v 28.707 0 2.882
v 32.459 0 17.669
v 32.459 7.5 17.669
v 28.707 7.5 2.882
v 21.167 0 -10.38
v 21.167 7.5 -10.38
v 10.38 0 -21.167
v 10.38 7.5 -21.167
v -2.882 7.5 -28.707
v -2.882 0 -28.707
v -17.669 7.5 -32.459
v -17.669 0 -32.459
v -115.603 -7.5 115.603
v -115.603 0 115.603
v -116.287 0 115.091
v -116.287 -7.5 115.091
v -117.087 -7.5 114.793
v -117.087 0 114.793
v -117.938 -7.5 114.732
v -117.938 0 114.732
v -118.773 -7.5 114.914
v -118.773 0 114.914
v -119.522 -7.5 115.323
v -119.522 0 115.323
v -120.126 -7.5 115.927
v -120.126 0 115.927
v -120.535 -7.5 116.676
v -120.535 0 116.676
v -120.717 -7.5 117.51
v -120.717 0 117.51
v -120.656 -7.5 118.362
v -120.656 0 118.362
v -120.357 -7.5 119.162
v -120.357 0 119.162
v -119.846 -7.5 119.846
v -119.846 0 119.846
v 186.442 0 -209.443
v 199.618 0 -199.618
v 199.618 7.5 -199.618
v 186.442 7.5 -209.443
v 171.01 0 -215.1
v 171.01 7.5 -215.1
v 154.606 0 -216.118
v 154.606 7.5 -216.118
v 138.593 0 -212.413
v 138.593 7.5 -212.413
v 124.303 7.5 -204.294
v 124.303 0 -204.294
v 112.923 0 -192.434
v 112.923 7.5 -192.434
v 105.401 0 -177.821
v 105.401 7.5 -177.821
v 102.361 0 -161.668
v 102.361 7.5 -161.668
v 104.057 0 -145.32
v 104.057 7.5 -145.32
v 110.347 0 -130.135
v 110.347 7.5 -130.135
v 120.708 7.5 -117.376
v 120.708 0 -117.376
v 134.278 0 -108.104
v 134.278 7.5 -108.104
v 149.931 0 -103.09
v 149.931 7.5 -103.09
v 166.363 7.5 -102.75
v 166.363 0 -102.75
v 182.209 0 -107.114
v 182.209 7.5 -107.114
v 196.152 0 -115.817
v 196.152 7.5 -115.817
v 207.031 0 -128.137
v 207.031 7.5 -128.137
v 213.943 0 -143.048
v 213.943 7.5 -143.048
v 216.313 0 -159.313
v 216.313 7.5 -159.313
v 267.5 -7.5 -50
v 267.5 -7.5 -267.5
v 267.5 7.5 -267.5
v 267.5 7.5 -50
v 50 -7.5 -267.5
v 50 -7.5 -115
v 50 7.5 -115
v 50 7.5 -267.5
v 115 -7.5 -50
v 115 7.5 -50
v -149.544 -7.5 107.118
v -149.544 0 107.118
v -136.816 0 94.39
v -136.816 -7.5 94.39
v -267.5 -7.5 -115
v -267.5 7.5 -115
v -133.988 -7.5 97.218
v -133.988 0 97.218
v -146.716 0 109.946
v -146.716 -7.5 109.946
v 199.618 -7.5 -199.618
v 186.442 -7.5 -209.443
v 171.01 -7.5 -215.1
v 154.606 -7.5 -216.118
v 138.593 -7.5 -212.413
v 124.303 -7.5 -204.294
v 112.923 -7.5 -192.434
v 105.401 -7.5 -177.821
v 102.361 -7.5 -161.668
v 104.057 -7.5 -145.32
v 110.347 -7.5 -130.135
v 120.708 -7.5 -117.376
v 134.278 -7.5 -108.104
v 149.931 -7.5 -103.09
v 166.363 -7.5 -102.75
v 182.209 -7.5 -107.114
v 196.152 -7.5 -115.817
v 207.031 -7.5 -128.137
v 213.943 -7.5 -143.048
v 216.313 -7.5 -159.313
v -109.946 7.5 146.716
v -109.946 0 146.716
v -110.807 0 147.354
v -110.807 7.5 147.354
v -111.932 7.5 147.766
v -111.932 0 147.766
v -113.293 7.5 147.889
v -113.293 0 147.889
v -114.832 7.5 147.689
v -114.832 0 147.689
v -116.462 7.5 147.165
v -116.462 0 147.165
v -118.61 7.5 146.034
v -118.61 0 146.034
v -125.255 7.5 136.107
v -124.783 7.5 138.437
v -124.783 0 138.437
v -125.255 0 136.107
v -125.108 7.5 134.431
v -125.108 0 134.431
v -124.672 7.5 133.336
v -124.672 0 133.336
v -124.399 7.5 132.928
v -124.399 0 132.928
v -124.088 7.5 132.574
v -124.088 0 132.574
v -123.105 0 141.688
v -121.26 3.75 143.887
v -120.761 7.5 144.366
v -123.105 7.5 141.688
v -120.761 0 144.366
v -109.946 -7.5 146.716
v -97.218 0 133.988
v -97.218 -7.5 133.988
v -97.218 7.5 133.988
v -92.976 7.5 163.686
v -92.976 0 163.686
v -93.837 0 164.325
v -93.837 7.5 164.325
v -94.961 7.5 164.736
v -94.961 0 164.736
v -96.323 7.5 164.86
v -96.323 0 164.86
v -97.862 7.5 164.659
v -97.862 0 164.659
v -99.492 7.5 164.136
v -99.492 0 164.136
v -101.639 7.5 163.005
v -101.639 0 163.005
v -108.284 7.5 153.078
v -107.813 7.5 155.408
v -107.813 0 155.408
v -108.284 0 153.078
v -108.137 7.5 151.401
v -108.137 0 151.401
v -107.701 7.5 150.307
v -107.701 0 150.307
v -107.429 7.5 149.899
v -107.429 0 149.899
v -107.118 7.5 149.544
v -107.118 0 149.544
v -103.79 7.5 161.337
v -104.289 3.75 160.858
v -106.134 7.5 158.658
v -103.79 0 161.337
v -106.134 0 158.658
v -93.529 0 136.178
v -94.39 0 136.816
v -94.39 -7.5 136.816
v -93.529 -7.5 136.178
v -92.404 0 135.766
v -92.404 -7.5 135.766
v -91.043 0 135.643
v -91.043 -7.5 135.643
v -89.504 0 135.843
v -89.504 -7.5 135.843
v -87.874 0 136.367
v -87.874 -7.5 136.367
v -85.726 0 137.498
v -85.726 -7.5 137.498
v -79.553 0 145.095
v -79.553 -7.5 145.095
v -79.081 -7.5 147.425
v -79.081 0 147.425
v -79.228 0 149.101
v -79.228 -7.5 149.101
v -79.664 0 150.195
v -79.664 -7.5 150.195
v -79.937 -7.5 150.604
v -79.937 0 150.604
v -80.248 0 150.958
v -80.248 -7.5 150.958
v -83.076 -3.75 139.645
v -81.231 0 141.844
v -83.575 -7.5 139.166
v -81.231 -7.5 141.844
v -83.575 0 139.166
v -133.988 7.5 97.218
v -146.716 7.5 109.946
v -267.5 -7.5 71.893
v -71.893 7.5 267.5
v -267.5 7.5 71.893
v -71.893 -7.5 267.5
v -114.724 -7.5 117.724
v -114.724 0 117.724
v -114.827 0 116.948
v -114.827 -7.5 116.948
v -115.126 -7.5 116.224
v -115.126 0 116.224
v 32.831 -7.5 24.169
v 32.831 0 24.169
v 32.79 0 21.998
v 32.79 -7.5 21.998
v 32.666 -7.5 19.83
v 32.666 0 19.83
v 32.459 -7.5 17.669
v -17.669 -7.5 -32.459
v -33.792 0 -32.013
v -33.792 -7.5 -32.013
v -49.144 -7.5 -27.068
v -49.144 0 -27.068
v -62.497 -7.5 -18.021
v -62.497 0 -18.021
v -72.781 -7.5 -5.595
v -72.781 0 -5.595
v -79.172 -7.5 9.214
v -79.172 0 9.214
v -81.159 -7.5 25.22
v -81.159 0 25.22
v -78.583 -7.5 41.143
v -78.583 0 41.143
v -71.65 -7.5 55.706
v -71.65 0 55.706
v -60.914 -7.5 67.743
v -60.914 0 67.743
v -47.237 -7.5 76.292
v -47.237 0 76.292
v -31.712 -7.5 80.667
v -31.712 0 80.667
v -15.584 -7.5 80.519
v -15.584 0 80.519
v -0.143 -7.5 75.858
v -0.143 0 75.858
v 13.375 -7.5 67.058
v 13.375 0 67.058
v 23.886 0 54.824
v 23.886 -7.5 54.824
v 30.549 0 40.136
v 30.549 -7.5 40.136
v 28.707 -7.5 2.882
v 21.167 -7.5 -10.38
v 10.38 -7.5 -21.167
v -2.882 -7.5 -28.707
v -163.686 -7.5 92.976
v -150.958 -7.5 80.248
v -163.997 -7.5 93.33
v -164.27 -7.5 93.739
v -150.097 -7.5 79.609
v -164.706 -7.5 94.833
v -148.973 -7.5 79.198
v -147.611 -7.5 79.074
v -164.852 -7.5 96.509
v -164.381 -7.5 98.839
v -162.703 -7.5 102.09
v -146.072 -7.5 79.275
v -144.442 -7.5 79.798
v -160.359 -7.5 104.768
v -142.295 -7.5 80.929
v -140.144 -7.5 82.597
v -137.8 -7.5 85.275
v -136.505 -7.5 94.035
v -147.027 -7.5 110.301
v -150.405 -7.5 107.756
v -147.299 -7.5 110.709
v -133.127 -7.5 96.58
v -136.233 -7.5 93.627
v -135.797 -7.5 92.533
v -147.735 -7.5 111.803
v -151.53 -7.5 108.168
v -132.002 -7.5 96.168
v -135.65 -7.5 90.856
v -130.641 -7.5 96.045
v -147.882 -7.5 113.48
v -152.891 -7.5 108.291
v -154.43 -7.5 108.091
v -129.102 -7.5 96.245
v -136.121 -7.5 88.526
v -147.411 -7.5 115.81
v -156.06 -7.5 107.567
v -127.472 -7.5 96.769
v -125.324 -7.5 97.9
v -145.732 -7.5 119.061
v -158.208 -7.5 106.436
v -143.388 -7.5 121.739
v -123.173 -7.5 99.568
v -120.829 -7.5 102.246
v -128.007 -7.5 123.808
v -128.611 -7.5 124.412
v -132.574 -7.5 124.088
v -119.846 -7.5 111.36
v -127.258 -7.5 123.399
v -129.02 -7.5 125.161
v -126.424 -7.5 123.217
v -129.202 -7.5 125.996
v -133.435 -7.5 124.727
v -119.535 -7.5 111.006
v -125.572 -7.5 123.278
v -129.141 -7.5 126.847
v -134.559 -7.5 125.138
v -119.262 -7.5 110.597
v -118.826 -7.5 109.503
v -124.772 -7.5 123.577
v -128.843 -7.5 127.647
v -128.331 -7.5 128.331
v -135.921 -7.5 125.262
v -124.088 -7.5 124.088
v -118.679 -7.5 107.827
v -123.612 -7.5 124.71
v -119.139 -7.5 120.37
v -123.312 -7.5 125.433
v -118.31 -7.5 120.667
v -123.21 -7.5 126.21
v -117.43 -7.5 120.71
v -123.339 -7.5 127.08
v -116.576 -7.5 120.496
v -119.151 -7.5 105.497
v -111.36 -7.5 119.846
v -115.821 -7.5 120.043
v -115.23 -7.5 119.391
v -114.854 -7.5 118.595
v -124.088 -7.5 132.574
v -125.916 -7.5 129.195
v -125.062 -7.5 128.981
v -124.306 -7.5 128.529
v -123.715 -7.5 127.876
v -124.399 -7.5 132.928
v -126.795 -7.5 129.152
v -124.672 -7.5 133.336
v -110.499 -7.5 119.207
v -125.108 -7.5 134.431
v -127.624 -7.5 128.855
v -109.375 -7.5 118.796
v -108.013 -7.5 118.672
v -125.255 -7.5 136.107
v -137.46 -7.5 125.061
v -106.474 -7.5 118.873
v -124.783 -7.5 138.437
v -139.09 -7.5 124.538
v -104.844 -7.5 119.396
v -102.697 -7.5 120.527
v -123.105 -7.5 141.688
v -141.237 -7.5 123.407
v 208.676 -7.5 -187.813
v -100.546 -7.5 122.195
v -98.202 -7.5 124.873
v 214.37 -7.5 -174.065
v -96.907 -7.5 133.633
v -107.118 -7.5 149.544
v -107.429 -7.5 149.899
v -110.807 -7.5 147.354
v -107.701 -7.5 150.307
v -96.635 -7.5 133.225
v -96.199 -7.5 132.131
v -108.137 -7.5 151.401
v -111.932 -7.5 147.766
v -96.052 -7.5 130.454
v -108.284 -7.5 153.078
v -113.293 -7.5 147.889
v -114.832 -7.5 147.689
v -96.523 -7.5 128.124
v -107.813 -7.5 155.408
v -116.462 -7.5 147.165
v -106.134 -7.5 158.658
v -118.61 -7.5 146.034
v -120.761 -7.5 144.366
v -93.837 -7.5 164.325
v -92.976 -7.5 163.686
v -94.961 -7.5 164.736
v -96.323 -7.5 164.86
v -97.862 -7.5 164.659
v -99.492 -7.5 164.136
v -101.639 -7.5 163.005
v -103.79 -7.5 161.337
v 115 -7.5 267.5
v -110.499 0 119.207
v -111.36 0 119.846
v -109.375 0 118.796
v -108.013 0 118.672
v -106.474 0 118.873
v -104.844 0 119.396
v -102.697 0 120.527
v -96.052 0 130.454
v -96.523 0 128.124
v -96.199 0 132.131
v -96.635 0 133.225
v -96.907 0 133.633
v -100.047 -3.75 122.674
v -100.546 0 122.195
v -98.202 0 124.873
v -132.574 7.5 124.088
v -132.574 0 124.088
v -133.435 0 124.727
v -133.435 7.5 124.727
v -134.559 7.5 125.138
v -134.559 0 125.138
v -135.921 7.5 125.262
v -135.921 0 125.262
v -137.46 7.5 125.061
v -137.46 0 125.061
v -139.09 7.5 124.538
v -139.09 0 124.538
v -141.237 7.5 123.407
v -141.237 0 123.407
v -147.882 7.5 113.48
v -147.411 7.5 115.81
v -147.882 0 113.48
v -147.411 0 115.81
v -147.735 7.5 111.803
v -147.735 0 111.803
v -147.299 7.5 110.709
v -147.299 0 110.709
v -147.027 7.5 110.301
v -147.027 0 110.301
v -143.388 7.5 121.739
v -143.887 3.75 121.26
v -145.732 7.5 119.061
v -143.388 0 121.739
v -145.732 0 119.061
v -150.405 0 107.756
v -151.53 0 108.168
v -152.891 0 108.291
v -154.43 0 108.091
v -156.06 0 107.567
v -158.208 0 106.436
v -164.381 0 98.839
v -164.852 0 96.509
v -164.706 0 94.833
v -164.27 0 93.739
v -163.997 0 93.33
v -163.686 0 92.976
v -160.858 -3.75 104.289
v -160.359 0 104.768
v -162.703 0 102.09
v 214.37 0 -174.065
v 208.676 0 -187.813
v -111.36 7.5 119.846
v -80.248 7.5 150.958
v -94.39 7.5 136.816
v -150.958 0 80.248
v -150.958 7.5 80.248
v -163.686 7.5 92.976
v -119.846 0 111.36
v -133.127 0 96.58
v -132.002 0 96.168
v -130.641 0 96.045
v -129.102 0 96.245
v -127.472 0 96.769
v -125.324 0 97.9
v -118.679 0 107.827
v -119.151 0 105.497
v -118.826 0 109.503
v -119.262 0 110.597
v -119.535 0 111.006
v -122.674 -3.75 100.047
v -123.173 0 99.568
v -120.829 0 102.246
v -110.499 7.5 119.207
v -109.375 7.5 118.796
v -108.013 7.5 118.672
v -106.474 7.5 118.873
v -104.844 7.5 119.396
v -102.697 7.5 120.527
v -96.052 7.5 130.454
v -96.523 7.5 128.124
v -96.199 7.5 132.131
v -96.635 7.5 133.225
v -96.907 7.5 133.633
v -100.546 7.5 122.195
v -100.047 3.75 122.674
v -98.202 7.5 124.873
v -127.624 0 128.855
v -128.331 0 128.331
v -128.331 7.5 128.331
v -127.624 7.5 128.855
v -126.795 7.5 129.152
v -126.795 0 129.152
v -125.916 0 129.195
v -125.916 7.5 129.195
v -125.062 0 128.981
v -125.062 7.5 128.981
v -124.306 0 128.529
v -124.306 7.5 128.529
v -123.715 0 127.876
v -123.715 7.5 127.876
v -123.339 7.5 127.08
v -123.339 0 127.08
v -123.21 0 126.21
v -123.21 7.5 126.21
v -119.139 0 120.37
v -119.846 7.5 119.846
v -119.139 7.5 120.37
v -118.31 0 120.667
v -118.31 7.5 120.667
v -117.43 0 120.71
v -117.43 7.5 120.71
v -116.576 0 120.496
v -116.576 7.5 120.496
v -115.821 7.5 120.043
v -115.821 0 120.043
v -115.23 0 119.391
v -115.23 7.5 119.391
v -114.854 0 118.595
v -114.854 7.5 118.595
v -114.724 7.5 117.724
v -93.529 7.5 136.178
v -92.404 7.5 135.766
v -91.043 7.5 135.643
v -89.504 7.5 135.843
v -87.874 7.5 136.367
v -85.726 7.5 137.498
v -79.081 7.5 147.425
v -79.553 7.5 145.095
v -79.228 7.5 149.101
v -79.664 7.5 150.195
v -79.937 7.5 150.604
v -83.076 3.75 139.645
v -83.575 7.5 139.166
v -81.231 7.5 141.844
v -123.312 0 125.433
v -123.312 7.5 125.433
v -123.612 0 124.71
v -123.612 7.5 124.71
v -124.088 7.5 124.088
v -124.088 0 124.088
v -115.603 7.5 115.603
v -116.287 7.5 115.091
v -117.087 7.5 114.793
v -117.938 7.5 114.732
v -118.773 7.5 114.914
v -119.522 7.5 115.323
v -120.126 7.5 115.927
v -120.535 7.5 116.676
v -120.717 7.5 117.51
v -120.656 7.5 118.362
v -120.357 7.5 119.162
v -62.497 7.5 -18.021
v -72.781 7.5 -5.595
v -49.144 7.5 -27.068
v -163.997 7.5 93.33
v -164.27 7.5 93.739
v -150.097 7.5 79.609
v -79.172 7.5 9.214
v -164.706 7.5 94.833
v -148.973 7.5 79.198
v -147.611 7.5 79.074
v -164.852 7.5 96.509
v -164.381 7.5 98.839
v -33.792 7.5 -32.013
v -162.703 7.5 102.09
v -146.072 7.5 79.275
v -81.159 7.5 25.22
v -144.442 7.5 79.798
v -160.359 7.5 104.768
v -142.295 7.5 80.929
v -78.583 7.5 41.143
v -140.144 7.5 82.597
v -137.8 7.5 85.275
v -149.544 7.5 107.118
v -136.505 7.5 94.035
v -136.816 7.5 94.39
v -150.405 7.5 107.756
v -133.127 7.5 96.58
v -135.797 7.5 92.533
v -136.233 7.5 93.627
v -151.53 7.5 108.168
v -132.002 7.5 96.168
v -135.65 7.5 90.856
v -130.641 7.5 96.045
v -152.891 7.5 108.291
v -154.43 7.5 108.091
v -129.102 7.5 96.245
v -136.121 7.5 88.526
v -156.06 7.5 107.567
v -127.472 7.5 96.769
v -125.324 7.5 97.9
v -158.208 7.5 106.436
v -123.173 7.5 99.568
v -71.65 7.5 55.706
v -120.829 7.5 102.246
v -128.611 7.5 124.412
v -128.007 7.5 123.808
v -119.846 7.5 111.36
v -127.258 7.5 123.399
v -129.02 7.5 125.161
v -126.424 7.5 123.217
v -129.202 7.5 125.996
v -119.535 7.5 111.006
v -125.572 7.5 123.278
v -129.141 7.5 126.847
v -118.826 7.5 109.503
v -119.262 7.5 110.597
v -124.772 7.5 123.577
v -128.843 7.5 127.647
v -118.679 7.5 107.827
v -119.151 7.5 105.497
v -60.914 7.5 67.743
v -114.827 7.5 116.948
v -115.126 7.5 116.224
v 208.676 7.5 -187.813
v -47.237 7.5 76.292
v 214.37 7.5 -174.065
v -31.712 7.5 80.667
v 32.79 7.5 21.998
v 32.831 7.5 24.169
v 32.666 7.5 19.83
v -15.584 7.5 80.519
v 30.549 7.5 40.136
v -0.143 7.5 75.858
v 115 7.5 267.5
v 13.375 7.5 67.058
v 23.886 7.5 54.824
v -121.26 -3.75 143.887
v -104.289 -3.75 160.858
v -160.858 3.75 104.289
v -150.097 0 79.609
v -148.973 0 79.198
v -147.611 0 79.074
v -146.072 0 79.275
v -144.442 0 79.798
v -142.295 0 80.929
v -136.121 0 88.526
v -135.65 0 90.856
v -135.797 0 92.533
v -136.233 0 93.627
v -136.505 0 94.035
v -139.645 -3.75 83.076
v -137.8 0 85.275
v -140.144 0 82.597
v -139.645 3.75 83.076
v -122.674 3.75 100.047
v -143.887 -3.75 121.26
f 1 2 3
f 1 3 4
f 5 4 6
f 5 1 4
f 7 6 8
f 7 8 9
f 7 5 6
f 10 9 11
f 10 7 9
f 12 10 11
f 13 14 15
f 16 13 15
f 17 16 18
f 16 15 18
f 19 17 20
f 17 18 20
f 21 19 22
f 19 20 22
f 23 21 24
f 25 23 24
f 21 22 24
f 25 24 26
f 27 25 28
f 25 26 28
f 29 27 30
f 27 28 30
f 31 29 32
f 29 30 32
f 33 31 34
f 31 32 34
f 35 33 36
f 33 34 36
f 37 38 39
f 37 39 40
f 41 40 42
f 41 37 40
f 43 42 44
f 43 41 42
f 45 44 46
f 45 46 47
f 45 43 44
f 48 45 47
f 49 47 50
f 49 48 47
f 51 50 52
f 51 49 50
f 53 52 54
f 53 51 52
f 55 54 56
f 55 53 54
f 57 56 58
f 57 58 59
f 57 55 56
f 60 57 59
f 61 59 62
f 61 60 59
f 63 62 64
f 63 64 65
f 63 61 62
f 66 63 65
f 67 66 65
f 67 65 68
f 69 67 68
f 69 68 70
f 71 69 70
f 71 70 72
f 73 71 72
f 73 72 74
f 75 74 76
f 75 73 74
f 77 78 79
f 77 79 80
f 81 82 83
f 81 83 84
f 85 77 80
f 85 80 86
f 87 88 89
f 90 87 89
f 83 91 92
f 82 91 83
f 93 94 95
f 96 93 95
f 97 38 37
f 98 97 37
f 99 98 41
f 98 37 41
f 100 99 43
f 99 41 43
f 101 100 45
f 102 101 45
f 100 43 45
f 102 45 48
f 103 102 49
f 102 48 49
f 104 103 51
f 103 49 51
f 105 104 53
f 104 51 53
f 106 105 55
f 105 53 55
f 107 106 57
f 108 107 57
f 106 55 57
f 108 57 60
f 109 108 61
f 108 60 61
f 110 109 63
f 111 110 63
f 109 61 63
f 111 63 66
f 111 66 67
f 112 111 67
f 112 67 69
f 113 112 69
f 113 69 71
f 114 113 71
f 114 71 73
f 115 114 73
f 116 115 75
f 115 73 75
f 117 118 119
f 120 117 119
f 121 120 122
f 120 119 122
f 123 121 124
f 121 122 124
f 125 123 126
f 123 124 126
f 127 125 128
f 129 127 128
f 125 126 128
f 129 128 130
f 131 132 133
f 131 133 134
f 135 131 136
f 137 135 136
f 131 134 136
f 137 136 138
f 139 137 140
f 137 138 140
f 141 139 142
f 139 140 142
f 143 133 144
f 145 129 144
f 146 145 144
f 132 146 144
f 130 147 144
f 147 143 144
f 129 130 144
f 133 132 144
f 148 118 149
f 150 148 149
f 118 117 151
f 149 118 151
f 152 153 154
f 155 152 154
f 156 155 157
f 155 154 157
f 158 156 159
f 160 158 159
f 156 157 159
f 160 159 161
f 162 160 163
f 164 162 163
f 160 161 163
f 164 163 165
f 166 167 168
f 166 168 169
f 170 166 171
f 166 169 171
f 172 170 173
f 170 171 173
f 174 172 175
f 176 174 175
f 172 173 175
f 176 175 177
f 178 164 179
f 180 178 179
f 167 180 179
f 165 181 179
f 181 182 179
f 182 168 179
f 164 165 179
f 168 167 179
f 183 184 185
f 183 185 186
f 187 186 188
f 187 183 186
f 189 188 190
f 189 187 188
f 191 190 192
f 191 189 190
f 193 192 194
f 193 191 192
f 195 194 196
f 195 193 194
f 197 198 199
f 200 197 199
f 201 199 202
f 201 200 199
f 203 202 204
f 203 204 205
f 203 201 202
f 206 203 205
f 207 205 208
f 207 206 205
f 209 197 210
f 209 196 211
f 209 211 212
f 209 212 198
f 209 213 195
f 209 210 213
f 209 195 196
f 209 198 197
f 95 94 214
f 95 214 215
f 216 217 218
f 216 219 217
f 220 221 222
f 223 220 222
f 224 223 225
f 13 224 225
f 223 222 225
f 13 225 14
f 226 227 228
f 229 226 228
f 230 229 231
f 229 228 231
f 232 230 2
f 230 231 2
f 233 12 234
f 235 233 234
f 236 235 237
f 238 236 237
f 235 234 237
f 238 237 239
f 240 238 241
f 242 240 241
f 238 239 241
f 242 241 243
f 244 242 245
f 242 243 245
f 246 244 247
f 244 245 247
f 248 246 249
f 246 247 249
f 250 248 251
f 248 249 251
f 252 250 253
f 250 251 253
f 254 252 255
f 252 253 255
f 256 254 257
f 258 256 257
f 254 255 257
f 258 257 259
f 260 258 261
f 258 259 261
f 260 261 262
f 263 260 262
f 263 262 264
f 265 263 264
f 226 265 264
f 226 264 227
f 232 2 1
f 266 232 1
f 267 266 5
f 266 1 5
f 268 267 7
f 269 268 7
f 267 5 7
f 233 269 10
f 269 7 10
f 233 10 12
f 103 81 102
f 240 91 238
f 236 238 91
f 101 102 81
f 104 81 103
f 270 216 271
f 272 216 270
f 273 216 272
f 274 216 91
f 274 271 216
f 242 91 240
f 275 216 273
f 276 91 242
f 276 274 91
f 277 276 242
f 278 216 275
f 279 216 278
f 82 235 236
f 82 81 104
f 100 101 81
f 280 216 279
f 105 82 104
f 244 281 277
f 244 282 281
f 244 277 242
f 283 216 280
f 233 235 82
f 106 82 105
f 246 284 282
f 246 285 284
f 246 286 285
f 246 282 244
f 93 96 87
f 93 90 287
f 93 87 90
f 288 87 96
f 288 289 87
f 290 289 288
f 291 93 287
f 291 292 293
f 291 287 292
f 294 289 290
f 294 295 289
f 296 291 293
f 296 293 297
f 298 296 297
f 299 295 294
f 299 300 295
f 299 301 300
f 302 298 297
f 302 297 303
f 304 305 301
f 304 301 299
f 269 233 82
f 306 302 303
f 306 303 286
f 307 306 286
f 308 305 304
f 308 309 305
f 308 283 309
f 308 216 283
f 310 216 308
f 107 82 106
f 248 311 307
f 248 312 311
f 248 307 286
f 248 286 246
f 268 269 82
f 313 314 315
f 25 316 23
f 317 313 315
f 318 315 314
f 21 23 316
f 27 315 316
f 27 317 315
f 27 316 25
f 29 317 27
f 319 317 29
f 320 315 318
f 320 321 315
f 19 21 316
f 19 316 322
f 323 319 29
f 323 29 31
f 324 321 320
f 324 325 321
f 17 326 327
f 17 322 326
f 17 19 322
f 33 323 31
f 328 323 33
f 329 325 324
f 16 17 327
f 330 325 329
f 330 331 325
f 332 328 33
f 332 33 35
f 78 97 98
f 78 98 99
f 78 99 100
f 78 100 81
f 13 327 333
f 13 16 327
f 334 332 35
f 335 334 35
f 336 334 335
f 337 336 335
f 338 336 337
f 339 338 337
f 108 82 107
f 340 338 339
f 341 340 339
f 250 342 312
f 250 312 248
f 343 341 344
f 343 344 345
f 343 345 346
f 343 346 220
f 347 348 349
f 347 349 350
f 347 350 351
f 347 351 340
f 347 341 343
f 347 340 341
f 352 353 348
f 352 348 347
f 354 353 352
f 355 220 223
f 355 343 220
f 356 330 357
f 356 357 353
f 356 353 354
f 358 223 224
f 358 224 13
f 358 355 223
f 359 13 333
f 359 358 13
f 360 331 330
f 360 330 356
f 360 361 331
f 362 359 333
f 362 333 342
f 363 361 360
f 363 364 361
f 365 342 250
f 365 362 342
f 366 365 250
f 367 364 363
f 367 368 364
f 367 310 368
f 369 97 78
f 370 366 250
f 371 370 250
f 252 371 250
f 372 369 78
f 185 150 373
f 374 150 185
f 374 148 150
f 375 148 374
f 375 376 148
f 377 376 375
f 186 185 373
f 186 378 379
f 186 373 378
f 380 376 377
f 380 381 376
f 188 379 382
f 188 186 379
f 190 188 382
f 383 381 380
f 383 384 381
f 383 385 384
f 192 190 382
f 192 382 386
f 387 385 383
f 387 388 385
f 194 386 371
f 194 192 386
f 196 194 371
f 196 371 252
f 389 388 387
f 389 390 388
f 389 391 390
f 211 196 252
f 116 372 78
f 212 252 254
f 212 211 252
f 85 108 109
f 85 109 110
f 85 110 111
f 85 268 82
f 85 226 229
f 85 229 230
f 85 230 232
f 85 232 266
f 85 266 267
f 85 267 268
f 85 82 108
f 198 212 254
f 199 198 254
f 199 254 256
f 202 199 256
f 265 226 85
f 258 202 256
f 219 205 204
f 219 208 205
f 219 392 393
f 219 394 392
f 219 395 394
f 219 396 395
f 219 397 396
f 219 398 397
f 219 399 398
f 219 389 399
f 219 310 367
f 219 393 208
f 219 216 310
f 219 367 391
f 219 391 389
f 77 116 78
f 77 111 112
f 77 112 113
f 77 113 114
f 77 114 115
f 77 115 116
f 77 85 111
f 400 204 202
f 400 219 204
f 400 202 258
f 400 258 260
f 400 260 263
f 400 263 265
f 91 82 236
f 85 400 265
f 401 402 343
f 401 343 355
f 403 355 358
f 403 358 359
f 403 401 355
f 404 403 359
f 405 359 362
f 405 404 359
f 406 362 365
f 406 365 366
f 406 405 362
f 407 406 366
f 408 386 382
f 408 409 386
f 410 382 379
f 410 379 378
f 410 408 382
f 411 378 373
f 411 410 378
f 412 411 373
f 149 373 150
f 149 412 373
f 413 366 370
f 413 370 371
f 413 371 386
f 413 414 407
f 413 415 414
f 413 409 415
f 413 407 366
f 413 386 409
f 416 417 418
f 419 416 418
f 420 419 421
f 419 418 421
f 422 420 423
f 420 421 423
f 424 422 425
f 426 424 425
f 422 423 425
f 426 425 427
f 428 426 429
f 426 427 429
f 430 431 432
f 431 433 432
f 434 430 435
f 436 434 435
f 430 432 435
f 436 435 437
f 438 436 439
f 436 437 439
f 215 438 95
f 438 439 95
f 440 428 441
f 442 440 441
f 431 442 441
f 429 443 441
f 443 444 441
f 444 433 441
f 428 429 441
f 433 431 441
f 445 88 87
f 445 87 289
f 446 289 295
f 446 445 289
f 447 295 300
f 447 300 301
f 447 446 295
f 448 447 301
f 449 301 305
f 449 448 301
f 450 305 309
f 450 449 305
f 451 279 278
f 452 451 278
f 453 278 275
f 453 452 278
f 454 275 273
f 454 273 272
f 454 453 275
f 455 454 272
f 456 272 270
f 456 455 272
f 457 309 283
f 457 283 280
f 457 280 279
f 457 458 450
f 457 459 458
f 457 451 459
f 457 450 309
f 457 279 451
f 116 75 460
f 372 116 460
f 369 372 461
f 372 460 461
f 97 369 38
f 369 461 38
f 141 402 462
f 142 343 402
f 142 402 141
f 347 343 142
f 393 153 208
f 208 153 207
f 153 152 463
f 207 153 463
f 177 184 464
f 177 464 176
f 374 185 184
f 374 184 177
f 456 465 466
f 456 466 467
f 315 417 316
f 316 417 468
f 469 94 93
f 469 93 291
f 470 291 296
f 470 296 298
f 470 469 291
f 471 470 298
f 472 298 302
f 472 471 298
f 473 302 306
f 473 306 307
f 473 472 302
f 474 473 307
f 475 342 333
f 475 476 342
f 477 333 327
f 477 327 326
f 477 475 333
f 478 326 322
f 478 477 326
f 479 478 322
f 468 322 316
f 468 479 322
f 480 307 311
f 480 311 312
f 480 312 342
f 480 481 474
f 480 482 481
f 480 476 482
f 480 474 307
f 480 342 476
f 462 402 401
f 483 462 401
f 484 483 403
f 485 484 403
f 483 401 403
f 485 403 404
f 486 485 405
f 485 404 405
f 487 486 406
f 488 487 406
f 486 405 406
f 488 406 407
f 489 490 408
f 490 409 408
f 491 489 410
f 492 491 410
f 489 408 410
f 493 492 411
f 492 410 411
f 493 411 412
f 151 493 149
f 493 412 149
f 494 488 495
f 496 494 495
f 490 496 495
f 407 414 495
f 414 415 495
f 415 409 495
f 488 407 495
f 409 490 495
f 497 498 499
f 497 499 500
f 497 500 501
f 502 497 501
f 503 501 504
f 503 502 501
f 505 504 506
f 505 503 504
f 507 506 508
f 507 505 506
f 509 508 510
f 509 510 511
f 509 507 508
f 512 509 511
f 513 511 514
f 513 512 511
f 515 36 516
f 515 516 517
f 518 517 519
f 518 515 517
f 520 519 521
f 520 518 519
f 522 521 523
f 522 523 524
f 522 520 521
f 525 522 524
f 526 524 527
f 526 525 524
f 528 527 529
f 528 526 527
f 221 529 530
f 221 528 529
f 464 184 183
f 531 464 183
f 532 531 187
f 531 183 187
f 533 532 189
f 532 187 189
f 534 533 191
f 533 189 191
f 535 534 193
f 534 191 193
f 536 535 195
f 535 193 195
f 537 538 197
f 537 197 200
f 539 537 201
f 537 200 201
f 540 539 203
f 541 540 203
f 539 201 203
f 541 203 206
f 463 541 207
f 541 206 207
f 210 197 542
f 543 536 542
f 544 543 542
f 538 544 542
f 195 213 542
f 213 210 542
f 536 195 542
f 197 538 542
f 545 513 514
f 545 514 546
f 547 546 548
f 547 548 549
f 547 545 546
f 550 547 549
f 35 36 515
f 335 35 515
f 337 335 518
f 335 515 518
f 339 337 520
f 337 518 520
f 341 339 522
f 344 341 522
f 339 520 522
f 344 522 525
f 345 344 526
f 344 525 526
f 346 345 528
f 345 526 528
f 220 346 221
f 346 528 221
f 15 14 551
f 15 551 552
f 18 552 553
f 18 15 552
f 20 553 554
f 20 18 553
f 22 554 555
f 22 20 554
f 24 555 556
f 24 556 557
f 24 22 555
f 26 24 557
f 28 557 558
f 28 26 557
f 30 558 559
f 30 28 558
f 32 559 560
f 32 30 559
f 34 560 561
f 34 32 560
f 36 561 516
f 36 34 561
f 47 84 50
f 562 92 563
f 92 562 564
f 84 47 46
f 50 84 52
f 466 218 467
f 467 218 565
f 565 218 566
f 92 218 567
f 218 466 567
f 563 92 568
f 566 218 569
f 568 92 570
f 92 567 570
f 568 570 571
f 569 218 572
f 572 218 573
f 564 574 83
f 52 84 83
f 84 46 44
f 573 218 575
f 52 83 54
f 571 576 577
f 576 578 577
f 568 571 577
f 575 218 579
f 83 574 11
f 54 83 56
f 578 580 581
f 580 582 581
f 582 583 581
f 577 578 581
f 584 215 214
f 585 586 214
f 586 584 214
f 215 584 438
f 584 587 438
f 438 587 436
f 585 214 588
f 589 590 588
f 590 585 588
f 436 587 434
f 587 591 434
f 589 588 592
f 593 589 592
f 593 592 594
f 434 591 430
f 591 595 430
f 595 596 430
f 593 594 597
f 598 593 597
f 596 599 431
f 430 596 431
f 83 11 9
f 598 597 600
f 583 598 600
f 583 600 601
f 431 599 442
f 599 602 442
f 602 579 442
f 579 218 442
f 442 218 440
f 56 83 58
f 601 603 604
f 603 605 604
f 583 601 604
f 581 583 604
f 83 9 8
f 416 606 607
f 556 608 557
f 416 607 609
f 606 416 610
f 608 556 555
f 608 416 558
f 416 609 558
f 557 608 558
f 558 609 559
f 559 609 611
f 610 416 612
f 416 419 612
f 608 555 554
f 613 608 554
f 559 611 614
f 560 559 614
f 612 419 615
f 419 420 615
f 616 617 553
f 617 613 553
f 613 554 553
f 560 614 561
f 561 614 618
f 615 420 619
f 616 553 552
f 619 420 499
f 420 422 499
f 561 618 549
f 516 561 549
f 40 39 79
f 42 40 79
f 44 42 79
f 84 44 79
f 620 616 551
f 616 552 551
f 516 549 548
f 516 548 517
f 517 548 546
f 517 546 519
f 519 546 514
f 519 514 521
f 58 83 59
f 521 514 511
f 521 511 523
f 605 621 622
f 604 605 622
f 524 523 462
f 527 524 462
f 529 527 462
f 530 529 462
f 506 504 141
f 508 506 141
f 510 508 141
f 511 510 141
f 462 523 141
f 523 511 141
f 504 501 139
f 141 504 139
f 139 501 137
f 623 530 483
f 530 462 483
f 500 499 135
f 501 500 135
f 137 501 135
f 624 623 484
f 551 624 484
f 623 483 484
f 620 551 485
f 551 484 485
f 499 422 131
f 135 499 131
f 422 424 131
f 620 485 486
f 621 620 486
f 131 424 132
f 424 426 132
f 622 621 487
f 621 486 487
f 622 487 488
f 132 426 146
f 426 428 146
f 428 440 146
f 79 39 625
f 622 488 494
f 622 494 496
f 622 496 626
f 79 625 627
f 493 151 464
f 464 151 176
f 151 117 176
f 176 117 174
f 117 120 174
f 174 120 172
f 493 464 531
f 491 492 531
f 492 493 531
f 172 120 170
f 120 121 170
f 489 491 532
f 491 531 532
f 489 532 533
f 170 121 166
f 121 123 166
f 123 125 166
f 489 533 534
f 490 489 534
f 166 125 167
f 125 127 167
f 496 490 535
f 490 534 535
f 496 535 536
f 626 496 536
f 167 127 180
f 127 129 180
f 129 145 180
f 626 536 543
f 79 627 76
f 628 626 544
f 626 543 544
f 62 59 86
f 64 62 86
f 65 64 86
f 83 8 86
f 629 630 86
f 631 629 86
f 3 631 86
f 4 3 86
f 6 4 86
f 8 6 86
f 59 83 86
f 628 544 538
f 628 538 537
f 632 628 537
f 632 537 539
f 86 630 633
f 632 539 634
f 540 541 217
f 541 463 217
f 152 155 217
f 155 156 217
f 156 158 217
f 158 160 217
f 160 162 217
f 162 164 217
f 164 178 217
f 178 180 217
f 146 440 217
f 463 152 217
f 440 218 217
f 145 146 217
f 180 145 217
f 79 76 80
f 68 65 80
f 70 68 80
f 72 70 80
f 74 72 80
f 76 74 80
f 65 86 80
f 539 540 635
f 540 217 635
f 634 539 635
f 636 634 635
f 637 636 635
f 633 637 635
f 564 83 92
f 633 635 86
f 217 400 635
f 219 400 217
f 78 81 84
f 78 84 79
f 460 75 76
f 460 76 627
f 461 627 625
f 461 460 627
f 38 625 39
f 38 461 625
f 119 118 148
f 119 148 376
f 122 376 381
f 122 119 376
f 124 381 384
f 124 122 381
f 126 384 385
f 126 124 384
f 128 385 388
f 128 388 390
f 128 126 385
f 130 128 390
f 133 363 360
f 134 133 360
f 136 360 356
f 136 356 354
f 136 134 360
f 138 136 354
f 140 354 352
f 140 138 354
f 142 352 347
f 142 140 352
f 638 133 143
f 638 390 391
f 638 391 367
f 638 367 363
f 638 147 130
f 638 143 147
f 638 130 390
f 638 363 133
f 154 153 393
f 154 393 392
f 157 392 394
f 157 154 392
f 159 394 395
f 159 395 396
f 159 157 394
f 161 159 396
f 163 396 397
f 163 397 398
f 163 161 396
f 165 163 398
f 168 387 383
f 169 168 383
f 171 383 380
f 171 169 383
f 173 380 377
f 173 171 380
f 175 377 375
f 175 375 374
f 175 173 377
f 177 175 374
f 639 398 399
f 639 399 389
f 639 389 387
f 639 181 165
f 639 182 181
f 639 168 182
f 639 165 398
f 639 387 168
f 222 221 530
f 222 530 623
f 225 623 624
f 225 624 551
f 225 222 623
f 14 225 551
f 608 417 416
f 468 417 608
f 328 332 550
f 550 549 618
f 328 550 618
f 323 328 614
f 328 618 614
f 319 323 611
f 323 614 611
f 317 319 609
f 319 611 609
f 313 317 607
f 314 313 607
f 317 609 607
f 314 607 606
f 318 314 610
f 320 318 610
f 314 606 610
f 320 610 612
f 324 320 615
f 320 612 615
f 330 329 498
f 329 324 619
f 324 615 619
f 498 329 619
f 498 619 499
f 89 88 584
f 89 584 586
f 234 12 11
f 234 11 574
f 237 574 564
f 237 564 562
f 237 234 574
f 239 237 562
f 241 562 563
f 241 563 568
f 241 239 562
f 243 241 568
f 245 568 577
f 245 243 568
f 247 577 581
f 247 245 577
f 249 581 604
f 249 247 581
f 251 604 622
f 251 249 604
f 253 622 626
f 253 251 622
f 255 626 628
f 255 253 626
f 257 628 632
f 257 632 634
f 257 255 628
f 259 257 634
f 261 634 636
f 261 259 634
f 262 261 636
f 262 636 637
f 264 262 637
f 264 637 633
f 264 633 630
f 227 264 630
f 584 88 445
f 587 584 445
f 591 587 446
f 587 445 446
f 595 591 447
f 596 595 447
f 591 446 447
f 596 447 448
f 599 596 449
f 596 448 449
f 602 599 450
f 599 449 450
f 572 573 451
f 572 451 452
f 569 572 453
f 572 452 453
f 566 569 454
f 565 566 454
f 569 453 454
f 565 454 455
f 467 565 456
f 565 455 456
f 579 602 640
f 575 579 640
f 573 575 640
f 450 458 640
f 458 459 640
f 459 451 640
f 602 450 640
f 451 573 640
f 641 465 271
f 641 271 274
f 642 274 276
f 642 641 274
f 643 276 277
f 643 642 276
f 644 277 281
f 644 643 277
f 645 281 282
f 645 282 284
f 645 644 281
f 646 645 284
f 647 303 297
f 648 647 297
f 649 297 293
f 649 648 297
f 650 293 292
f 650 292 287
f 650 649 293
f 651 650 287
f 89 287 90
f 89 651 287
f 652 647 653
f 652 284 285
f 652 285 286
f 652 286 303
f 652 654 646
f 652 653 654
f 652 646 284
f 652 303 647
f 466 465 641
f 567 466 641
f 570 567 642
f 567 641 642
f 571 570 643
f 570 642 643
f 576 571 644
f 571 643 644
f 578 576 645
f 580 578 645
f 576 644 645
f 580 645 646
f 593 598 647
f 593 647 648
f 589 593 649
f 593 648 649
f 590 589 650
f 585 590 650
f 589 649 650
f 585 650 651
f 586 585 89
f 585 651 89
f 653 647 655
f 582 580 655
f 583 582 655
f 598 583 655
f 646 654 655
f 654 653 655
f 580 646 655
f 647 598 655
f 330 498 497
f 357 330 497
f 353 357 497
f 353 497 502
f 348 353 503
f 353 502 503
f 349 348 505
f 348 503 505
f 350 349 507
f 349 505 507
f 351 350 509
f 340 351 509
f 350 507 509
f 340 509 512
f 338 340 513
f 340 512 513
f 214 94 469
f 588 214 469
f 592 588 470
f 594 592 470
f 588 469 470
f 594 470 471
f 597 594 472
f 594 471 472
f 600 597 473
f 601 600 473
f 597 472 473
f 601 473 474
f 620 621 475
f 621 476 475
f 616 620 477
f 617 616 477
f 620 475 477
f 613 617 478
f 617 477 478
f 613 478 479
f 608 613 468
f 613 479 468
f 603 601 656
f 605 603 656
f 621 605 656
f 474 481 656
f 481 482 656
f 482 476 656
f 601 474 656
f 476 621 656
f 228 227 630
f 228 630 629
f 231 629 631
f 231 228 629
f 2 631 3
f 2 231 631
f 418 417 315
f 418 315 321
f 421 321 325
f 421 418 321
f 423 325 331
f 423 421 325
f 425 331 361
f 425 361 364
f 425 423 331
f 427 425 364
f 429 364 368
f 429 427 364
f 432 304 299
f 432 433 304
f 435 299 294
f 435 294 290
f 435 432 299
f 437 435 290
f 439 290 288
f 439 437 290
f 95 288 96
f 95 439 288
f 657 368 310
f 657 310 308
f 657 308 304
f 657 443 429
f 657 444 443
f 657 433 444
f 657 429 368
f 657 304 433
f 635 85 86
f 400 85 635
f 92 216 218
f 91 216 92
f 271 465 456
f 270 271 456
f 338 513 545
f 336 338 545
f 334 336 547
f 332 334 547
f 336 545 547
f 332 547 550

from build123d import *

# Parameters (mm, degrees)
F1_DEPTH = 7.5


with BuildPart() as f1:
    # F0 (on Front) → F1 (new body, symmetric)
    with BuildSketch(Plane.XZ):
        Polygon((-169.6966991411, 169.6966991411), (-267.5, 71.8933982822), (-267.5, -115), (-260, -115), (-260, 68.7867965644), (-164.3933982822, 164.3933982822), align=None)
        Polygon((-71.8933982822, 267.5), (-169.6966991411, 169.6966991411), (-164.3933982822, 164.3933982822), (-68.7867965644, 260), (115, 260), (115, 267.5), align=None)
        with BuildLine():
            Line((-68.7867965644, 260), (-164.3933982822, 164.3933982822))
            Line((-164.3933982822, 164.3933982822), (-128.3309524417, 128.3309524417))
            ThreePointArc((-128.3309524417, 128.3309524417), (-125.061581801, 128.9812706957), (-123.2096320981, 126.2096320981))
            ThreePointArc((-123.2096320981, 126.2096320981), (-123.4379935006, 125.061581801), (-124.0883117546, 124.0883117546))
            Line((-124.0883117546, 124.0883117546), (-119.8456710674, 119.8456710674))
            ThreePointArc((-119.8456710674, 119.8456710674), (-116.5763004268, 120.4959893214), (-114.7243507239, 117.7243507239))
            ThreePointArc((-114.7243507239, 117.7243507239), (-114.9527121264, 116.5763004268), (-115.6030303803, 115.6030303803))
            Line((-115.6030303803, 115.6030303803), (-64.4738274856, 64.4738274856))
            ThreePointArc((-64.4738274856, 64.4738274856), (-2.3557853132, 76.8298743111), (32.831259042, 24.168740958))
            ThreePointArc((32.831259042, 24.168740958), (32.738226427, 20.9134279091), (32.4594322685, 17.668741186))
            Line((32.4594322685, 17.668741186), (115, 17.668741186))
            Line((115, 17.668741186), (115, 260))
            Line((115, 260), (-68.7867965644, 260))
        make_face()
        with BuildLine():
            add(Edge.make_bspline(
                [(-111.3603896932, 119.8456710674), (-107.1177490061, 115.6030303803), (-100.0466811942, 122.6740981922), (-92.9756133824, 129.7451660041), (-97.2182540695, 133.9878066912)],
                knots=[0, 0, 0, 1.5707963268, 1.5707963268, 3.1415926536, 3.1415926536, 3.1415926536], degree=2, weights=[1, 0.7071067812, 1, 0.7071067812, 1]))
            Line((-111.3603896932, 119.8456710674), (-124.0883117546, 132.5735931288))
            add(Edge.make_bspline(
                [(-109.9461761308, 146.7157287525), (-114.188816818, 150.9583694397), (-121.2598846298, 143.8873016278), (-128.3309524417, 136.8162338159), (-124.0883117546, 132.5735931288)],
                knots=[0, 0, 0, 1.5707963268, 1.5707963268, 3.1415926536, 3.1415926536, 3.1415926536], degree=2, weights=[1, 0.7071067812, 1, 0.7071067812, 1]))
            Line((-109.9461761308, 146.7157287525), (-97.2182540695, 133.9878066912))
        make_face(mode=Mode.SUBTRACT)
        with BuildLine():
            Line((-94.3898269447, 136.8162338159), (-107.1177490061, 149.5441558773))
            add(Edge.make_bspline(
                [(-92.9756133824, 163.686291501), (-97.2182540695, 167.9289321881), (-104.2893218813, 160.8578643763), (-111.3603896932, 153.7867965644), (-107.1177490061, 149.5441558773)],
                knots=[3.1415926536, 3.1415926536, 3.1415926536, 4.7123889804, 4.7123889804, 6.2831853072, 6.2831853072, 6.2831853072], degree=2, weights=[1, 0.7071067812, 1, 0.7071067812, 1]))
            Line((-92.9756133824, 163.686291501), (-80.247691321, 150.9583694397))
            add(Edge.make_bspline(
                [(-94.3898269447, 136.8162338159), (-90.1471862576, 132.5735931288), (-83.0761184457, 139.6446609407), (-76.0050506339, 146.7157287525), (-80.247691321, 150.9583694397)],
                knots=[0, 0, 0, 1.5707963268, 1.5707963268, 3.1415926536, 3.1415926536, 3.1415926536], degree=2, weights=[1, 0.7071067812, 1, 0.7071067812, 1]))
        make_face(mode=Mode.SUBTRACT)
        with BuildLine():
            Line((-128.3309524417, 128.3309524417), (-164.3933982822, 164.3933982822))
            Line((-164.3933982822, 164.3933982822), (-260, 68.7867965644))
            Line((-260, 68.7867965644), (-260, -115))
            Line((-260, -115), (-17.668741186, -115))
            Line((-17.668741186, -115), (-17.668741186, -32.4594322685))
            ThreePointArc((-17.668741186, -32.4594322685), (-75.4981690113, -0.6161297442), (-64.4738274856, 64.4738274856))
            Line((-64.4738274856, 64.4738274856), (-115.6030303803, 115.6030303803))
            ThreePointArc((-115.6030303803, 115.6030303803), (-119.8456710674, 115.6030303803), (-119.8456710674, 119.8456710674))
            Line((-119.8456710674, 119.8456710674), (-124.0883117546, 124.0883117546))
            ThreePointArc((-124.0883117546, 124.0883117546), (-128.3309524417, 124.0883117546), (-128.3309524417, 128.3309524417))
        make_face()
        with BuildLine():
            add(Edge.make_bspline(
                [(-150.9583694397, 80.247691321), (-146.7157287525, 76.0050506339), (-139.6446609407, 83.0761184457)],
                knots=[0, 0, 0, 1.5707963268, 1.5707963268, 1.5707963268], degree=2, weights=[1, 0.7071067812, 1]))
            Line((-150.9583694397, 80.247691321), (-163.686291501, 92.9756133824))
            add(Edge.make_bspline(
                [(-160.8578643763, 104.2893218813), (-167.9289321881, 97.2182540695), (-163.686291501, 92.9756133824)],
                knots=[1.5707963268, 1.5707963268, 1.5707963268, 3.1415926536, 3.1415926536, 3.1415926536], degree=2, weights=[1, 0.7071067812, 1]))
            add(Edge.make_bspline(
                [(-149.5441558773, 107.1177490061), (-153.7867965644, 111.3603896932), (-160.8578643763, 104.2893218813)],
                knots=[0, 0, 0, 1.5707963268, 1.5707963268, 1.5707963268], degree=2, weights=[1, 0.7071067812, 1]))
            Line((-149.5441558773, 107.1177490061), (-136.8162338159, 94.3898269447))
            add(Edge.make_bspline(
                [(-139.6446609407, 83.0761184457), (-132.5735931288, 90.1471862576), (-136.8162338159, 94.3898269447)],
                knots=[1.5707963268, 1.5707963268, 1.5707963268, 3.1415926536, 3.1415926536, 3.1415926536], degree=2, weights=[1, 0.7071067812, 1]))
        make_face(mode=Mode.SUBTRACT)
        with BuildLine():
            add(Edge.make_bspline(
                [(-132.5735931288, 124.0883117546), (-136.8162338159, 128.3309524417), (-143.8873016278, 121.2598846298), (-150.9583694397, 114.188816818), (-146.7157287525, 109.9461761308)],
                knots=[3.1415926536, 3.1415926536, 3.1415926536, 4.7123889804, 4.7123889804, 6.2831853072, 6.2831853072, 6.2831853072], degree=2, weights=[1, 0.7071067812, 1, 0.7071067812, 1]))
            Line((-132.5735931288, 124.0883117546), (-119.8456710674, 111.3603896932))
            add(Edge.make_bspline(
                [(-133.9878066912, 97.2182540695), (-129.7451660041, 92.9756133824), (-122.6740981922, 100.0466811942), (-115.6030303803, 107.1177490061), (-119.8456710674, 111.3603896932)],
                knots=[0, 0, 0, 1.5707963268, 1.5707963268, 3.1415926536, 3.1415926536, 3.1415926536], degree=2, weights=[1, 0.7071067812, 1, 0.7071067812, 1]))
            Line((-133.9878066912, 97.2182540695), (-146.7157287525, 109.9461761308))
        make_face(mode=Mode.SUBTRACT)
        with BuildLine():
            Line((-17.668741186, -32.4594322685), (-17.668741186, -115))
            Line((-17.668741186, -115), (35, -115))
            Line((35, -115), (50, -115))
            Line((50, -115), (50, -130))
            Line((50, -130), (50, -260))
            Line((50, -260), (260, -260))
            Line((260, -260), (260, -50))
            Line((260, -50), (130, -50))
            Line((130, -50), (115, -50))
            Line((115, -50), (115, -35))
            Line((115, -35), (115, 17.668741186))
            Line((115, 17.668741186), (32.4594322685, 17.668741186))
            ThreePointArc((32.4594322685, 17.668741186), (16.1363455697, -16.1363455697), (-17.668741186, -32.4594322685))
        make_face()
        with BuildLine():
            ThreePointArc((216.3126624785, -159.3126624785), (211.9737958316, -181.1256181233), (199.6177490061, -199.6177490061))
            ThreePointArc((199.6177490061, -199.6177490061), (106.6515291253, -137.4997068336), (216.3126624785, -159.3126624785))
        make_face(mode=Mode.SUBTRACT)
        Polygon((260, -260), (50, -260), (50, -267.5), (267.5, -267.5), align=None)
        Polygon((260, -50), (260, -260), (267.5, -267.5), (267.5, -50), align=None)
    extrude(amount=F1_DEPTH, both=True)


solid = f1.part
